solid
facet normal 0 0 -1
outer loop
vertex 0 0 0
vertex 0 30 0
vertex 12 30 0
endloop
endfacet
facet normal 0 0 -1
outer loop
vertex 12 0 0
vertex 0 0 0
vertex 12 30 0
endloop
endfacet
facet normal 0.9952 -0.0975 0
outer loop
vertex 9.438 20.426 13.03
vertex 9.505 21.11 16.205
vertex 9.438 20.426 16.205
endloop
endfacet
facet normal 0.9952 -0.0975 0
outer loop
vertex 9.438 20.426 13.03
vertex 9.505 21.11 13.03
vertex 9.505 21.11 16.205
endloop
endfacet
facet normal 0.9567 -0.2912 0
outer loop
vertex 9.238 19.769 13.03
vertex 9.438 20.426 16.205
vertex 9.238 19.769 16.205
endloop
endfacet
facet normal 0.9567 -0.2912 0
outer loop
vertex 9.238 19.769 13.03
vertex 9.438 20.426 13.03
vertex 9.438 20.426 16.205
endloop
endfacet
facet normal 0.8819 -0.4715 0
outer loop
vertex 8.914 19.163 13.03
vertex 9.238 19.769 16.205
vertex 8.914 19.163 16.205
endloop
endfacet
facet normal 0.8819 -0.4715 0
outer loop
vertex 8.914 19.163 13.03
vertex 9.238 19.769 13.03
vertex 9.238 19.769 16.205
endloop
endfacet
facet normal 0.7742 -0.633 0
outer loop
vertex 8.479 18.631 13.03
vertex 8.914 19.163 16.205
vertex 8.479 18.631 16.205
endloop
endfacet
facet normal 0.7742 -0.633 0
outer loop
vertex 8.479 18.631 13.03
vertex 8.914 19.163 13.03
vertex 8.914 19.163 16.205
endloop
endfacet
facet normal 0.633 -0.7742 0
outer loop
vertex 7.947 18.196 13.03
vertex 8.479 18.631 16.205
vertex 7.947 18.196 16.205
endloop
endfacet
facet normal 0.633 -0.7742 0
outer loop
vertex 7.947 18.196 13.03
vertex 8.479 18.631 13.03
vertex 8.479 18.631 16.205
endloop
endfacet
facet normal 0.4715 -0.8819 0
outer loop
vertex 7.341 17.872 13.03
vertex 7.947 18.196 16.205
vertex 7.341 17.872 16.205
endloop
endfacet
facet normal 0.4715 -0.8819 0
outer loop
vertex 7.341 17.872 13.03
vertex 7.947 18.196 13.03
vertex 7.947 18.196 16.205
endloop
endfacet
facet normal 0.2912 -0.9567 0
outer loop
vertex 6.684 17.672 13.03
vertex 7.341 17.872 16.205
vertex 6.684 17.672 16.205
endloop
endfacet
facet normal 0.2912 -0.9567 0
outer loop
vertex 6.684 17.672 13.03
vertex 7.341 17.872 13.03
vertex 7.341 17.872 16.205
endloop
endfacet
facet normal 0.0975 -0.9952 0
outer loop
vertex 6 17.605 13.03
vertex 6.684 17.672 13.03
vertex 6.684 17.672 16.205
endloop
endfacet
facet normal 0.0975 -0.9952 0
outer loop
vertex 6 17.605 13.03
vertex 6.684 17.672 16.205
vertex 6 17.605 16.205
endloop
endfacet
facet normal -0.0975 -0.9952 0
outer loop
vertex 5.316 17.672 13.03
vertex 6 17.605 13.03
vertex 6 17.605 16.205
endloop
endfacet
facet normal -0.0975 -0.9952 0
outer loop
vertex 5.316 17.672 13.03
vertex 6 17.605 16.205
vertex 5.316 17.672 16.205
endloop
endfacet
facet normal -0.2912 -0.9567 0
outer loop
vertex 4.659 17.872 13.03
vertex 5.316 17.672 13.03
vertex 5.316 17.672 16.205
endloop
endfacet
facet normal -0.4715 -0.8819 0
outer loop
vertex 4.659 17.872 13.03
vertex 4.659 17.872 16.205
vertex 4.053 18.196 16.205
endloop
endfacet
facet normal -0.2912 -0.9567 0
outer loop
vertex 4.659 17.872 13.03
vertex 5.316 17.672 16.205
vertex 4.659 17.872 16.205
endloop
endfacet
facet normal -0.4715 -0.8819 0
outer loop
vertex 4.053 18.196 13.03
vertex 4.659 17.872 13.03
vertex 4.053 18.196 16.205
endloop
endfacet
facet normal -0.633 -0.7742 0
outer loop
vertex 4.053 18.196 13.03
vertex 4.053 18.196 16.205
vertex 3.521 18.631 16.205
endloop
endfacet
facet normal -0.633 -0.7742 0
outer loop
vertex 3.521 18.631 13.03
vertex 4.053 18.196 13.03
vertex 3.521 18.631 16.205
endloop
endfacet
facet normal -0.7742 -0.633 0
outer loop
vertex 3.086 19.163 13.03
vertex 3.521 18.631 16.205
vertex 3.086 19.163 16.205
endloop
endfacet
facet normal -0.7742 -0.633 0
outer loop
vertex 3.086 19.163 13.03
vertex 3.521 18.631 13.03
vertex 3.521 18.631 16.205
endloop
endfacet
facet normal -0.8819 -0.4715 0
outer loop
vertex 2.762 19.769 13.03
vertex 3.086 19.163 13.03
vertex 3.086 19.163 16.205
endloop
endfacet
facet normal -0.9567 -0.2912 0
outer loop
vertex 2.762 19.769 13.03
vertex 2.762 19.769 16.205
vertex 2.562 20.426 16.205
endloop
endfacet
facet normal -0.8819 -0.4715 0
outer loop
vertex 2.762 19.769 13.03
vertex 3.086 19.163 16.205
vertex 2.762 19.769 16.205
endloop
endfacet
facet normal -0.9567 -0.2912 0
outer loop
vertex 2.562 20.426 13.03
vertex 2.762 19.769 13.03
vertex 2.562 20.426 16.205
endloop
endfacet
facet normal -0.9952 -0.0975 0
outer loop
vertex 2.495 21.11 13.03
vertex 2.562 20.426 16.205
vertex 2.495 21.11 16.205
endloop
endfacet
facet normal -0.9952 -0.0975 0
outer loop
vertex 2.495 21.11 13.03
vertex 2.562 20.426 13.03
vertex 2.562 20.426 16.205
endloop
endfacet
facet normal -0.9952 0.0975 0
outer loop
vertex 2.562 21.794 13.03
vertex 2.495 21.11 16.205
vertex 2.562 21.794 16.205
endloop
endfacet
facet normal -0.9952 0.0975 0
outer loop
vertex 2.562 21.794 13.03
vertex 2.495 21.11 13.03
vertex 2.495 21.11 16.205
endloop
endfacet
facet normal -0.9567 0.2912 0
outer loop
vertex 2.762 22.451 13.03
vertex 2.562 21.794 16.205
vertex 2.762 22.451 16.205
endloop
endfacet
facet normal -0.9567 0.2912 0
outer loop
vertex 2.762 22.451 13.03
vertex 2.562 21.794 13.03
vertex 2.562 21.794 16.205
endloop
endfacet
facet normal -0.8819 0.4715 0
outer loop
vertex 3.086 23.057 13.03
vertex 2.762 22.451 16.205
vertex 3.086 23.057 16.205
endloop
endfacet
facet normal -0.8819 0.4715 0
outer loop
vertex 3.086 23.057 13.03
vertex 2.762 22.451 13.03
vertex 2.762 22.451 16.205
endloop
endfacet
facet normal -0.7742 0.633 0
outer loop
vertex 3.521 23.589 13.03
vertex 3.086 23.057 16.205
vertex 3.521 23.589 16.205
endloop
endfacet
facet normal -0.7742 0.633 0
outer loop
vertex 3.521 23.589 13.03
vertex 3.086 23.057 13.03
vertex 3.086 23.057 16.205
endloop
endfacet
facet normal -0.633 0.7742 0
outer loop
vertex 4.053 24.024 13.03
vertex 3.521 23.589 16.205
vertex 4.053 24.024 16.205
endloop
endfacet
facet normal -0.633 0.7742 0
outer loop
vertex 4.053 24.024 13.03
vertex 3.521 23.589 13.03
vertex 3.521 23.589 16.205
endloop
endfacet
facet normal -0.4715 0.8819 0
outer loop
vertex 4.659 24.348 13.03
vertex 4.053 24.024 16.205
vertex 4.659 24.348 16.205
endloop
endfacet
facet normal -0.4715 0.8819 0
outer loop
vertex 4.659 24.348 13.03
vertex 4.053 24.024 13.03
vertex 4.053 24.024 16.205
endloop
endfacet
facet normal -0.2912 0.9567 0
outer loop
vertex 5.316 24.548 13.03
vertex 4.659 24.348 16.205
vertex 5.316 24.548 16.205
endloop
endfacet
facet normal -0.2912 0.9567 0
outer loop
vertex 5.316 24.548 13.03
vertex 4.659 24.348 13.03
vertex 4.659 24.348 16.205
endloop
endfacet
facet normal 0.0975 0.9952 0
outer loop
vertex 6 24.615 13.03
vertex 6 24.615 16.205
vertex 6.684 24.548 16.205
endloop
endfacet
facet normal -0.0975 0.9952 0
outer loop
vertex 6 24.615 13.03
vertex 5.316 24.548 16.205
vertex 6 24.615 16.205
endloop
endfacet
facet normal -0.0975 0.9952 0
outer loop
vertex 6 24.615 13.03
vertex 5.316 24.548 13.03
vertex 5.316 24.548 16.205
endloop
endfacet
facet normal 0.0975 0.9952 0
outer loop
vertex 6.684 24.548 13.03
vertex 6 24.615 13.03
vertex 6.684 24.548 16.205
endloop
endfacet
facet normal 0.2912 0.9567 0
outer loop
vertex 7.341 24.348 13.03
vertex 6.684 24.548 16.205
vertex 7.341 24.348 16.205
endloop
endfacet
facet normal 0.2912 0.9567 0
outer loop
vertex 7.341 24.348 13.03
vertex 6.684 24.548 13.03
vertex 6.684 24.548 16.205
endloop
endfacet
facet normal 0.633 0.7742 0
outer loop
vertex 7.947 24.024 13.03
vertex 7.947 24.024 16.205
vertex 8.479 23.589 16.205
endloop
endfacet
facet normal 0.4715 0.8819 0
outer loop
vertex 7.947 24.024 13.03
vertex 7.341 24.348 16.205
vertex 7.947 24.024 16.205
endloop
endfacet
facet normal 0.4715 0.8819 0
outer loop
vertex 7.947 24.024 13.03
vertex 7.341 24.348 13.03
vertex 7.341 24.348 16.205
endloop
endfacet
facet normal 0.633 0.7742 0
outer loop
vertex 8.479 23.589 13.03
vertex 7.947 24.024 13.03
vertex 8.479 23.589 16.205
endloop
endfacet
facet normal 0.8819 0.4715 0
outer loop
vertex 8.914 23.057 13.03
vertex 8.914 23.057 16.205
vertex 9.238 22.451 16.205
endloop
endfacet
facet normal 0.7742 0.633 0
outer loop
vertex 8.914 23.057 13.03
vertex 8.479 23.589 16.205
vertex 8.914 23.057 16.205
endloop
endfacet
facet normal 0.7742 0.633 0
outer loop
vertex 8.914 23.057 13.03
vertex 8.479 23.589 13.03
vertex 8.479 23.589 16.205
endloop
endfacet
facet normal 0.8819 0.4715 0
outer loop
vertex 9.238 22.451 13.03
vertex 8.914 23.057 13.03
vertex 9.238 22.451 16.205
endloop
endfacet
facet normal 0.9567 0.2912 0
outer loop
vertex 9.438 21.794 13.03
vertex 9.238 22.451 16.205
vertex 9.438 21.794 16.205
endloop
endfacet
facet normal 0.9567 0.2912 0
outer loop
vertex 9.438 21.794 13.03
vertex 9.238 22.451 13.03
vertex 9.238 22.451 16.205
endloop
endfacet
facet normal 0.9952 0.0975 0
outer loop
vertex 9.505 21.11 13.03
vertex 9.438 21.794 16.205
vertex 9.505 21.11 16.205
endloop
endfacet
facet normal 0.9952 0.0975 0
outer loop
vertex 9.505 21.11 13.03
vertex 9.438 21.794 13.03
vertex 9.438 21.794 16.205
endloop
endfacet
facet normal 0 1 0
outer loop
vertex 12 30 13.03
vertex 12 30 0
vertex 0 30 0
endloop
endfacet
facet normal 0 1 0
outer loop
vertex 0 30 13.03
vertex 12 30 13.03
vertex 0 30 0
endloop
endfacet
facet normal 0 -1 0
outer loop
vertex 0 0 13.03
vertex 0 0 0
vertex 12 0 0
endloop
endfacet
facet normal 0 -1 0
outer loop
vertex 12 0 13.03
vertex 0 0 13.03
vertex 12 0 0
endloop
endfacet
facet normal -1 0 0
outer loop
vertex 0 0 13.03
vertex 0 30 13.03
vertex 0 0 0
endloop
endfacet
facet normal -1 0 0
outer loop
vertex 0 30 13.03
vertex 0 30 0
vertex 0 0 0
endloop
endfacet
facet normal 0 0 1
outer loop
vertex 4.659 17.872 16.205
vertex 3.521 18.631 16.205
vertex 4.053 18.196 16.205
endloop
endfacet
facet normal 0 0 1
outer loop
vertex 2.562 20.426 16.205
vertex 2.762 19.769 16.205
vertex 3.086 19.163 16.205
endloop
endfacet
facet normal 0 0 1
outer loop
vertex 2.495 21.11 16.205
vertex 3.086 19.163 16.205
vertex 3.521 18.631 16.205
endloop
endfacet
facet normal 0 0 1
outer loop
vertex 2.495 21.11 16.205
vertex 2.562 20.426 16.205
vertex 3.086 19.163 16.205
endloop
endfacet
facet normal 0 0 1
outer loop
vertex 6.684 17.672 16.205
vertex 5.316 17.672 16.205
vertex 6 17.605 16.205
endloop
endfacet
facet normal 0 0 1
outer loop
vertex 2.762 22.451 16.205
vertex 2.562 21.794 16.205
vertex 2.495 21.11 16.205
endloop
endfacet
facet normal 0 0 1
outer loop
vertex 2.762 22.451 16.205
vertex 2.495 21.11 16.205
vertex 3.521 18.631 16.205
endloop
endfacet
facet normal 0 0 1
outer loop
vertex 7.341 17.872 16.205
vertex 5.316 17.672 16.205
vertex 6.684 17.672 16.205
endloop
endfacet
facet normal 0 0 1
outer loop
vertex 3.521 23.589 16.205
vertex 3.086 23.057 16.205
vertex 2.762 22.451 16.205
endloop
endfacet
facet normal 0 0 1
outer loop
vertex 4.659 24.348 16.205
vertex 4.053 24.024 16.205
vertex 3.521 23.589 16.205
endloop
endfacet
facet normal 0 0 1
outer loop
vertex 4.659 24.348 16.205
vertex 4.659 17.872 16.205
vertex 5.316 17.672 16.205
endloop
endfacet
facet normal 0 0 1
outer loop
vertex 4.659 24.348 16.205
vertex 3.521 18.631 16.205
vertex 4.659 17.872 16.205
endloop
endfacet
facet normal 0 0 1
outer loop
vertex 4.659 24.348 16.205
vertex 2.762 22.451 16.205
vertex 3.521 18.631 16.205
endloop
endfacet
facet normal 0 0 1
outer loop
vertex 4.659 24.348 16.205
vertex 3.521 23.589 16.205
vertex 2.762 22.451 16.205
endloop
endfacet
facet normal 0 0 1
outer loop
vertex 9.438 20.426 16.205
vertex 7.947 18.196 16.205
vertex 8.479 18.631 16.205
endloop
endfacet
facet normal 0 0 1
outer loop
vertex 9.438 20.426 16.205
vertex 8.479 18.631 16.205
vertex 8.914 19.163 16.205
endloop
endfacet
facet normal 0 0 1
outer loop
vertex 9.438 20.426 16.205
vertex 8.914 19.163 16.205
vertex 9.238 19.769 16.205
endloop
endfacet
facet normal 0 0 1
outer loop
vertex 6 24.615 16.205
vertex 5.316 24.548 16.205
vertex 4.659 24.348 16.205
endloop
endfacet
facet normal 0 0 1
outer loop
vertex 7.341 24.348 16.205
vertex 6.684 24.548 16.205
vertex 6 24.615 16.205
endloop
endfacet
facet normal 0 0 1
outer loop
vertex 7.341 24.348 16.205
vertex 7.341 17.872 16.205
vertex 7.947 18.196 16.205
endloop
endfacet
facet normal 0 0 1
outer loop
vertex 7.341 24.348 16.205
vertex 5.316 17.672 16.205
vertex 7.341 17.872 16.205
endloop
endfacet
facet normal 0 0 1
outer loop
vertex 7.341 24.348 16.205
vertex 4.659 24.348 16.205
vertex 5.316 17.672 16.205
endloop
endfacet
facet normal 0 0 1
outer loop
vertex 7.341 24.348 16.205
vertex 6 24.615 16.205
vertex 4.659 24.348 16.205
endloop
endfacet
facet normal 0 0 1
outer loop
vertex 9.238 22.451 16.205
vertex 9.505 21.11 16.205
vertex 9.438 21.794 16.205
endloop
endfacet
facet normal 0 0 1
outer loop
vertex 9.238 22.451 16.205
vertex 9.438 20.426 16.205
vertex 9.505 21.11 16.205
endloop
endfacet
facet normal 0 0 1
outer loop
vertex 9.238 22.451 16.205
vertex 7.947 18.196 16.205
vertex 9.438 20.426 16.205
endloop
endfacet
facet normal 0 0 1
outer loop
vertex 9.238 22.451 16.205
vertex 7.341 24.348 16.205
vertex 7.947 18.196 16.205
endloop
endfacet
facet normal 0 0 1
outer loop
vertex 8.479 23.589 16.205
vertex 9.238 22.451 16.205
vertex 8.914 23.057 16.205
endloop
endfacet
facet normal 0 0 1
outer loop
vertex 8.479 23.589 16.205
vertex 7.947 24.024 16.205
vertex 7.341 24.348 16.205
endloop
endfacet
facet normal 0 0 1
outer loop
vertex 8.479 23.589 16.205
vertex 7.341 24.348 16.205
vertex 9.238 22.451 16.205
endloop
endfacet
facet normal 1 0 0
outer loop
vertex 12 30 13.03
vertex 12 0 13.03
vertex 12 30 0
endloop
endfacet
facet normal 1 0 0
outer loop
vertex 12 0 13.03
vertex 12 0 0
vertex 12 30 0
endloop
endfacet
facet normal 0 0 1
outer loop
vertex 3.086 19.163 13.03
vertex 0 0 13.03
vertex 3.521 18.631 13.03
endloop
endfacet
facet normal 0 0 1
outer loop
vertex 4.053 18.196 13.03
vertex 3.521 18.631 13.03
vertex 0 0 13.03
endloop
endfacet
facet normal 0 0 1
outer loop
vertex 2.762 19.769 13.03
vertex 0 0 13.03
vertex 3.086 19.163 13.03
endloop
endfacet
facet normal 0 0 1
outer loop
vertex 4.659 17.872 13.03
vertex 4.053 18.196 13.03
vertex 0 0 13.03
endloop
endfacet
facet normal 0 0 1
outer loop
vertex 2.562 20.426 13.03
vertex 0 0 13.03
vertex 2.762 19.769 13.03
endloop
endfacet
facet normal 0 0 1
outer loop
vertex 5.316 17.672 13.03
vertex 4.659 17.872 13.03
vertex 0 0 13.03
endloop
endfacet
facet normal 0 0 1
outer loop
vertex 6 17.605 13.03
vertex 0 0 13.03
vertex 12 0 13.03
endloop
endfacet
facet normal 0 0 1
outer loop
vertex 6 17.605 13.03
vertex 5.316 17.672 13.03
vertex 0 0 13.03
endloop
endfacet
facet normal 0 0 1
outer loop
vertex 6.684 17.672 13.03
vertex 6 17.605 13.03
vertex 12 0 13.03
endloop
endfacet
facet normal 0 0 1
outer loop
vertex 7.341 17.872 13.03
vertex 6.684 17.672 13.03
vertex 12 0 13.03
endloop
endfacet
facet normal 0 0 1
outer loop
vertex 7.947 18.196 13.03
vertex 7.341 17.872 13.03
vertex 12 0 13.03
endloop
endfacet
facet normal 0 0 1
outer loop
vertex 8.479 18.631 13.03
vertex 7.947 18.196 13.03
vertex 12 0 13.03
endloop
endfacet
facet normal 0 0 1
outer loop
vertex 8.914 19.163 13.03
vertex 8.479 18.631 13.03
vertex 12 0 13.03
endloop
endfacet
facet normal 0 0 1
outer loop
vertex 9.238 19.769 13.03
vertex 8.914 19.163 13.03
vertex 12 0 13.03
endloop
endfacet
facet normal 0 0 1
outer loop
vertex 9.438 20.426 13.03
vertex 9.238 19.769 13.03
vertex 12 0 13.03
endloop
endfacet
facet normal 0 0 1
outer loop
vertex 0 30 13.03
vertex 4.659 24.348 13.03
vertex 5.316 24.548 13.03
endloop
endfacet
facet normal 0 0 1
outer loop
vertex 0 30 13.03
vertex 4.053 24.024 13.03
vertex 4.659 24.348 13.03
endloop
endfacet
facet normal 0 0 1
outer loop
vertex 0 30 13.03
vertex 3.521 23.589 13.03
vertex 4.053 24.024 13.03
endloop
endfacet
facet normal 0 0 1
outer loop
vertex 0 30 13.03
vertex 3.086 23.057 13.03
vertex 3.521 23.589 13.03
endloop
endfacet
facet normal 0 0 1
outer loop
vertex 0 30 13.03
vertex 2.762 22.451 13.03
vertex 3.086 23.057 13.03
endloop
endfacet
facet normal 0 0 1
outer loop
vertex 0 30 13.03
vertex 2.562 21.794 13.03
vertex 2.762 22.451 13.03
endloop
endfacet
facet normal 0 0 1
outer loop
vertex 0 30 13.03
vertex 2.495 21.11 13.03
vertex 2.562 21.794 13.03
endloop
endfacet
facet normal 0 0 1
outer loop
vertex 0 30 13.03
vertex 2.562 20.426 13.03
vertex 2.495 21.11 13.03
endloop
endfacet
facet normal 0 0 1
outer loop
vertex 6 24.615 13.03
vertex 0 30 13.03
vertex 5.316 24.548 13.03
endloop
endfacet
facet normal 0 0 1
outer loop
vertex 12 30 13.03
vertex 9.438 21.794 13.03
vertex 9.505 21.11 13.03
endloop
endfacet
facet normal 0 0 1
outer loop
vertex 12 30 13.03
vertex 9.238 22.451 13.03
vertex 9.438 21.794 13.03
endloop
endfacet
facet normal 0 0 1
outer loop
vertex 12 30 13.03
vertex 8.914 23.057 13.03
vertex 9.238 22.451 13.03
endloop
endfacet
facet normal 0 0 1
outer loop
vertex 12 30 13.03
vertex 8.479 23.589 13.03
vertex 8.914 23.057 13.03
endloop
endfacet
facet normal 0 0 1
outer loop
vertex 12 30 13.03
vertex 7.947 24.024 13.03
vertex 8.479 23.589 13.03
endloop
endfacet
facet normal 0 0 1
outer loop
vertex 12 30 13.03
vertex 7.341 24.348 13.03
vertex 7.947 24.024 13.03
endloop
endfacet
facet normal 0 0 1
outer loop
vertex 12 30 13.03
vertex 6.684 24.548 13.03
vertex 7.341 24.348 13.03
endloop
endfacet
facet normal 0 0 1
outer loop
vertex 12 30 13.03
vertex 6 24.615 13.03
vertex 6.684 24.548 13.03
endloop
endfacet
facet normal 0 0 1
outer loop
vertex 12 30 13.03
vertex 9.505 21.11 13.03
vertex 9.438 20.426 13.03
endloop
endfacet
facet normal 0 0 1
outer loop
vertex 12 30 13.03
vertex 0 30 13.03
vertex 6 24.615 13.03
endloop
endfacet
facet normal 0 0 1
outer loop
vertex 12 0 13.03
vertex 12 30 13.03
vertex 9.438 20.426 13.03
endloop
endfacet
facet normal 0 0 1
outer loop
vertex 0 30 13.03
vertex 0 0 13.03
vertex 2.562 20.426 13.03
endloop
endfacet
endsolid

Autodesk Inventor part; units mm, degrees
ref_plane "YZ Plane" through (0, 0, 0) normal (1, 0, 0) x (0, 1, 0)
ref_plane "XZ Plane" through (0, 0, 0) normal (0, 1, 0) x (-1, 0, 0)
ref_plane "XY Plane" through (0, 0, 0) normal (0, 0, 1) x (1, 0, 0)
sketch "Sketch1" plane through (0, 0, 0) normal (0, 0, 1) x (1, 0, 0)
  line L0 (0, 0) -> (12, 0)
  line L1 (12, 0) -> (12, 30)
  line L2 (12, 30) -> (0, 30)
  line L3 (0, 30) -> (0, 0)
  dimension "d0" = 12
  dimension "d1" = 30
extrude "Extrusion1" add sketch "Sketch1" along normal blind 13.0302
sketch "Sketch2" plane through (0, 0, 13.0302) normal (0, 0, 1) x (1, 0, 0)
  line L0 (12, 30) -> (0, 30) projected
  line L1 (0, 30) -> (0, 0) projected
  circle A0 centre (6, 21.11) radius 3.5052
  dimension "d4" = 6
  dimension "d5" = 8.89
  dimension "d8" = 7.0104
extrude "Extrusion2" add sketch "Sketch2" along normal blind 3.175
equation "\"d0\" = servoWidth"
equation "\"d1\" = servoLength"
equation "\"d2\" = servoHeight"
equation "\"d4\" = 0.5 * servoWidth"
equation "\"d5\" = hornOffset"
equation "\"d8\" = hornCenter"
equation "\"d6\" = thick"
equation "\"servoLength\" = 30"
equation "\"servoWidth\" = 12"
equation "\"hornCenter\" = 7.0104"
equation "\"hornDia\" = 13.1572"
equation "\"hornHole\" = 1.524"
equation "\"hornOffset\" = 8.89"
equation "\"servoHeight\" = 13.0302"
equation "\"thick\" = 3.175"
properties part number "Servo"
